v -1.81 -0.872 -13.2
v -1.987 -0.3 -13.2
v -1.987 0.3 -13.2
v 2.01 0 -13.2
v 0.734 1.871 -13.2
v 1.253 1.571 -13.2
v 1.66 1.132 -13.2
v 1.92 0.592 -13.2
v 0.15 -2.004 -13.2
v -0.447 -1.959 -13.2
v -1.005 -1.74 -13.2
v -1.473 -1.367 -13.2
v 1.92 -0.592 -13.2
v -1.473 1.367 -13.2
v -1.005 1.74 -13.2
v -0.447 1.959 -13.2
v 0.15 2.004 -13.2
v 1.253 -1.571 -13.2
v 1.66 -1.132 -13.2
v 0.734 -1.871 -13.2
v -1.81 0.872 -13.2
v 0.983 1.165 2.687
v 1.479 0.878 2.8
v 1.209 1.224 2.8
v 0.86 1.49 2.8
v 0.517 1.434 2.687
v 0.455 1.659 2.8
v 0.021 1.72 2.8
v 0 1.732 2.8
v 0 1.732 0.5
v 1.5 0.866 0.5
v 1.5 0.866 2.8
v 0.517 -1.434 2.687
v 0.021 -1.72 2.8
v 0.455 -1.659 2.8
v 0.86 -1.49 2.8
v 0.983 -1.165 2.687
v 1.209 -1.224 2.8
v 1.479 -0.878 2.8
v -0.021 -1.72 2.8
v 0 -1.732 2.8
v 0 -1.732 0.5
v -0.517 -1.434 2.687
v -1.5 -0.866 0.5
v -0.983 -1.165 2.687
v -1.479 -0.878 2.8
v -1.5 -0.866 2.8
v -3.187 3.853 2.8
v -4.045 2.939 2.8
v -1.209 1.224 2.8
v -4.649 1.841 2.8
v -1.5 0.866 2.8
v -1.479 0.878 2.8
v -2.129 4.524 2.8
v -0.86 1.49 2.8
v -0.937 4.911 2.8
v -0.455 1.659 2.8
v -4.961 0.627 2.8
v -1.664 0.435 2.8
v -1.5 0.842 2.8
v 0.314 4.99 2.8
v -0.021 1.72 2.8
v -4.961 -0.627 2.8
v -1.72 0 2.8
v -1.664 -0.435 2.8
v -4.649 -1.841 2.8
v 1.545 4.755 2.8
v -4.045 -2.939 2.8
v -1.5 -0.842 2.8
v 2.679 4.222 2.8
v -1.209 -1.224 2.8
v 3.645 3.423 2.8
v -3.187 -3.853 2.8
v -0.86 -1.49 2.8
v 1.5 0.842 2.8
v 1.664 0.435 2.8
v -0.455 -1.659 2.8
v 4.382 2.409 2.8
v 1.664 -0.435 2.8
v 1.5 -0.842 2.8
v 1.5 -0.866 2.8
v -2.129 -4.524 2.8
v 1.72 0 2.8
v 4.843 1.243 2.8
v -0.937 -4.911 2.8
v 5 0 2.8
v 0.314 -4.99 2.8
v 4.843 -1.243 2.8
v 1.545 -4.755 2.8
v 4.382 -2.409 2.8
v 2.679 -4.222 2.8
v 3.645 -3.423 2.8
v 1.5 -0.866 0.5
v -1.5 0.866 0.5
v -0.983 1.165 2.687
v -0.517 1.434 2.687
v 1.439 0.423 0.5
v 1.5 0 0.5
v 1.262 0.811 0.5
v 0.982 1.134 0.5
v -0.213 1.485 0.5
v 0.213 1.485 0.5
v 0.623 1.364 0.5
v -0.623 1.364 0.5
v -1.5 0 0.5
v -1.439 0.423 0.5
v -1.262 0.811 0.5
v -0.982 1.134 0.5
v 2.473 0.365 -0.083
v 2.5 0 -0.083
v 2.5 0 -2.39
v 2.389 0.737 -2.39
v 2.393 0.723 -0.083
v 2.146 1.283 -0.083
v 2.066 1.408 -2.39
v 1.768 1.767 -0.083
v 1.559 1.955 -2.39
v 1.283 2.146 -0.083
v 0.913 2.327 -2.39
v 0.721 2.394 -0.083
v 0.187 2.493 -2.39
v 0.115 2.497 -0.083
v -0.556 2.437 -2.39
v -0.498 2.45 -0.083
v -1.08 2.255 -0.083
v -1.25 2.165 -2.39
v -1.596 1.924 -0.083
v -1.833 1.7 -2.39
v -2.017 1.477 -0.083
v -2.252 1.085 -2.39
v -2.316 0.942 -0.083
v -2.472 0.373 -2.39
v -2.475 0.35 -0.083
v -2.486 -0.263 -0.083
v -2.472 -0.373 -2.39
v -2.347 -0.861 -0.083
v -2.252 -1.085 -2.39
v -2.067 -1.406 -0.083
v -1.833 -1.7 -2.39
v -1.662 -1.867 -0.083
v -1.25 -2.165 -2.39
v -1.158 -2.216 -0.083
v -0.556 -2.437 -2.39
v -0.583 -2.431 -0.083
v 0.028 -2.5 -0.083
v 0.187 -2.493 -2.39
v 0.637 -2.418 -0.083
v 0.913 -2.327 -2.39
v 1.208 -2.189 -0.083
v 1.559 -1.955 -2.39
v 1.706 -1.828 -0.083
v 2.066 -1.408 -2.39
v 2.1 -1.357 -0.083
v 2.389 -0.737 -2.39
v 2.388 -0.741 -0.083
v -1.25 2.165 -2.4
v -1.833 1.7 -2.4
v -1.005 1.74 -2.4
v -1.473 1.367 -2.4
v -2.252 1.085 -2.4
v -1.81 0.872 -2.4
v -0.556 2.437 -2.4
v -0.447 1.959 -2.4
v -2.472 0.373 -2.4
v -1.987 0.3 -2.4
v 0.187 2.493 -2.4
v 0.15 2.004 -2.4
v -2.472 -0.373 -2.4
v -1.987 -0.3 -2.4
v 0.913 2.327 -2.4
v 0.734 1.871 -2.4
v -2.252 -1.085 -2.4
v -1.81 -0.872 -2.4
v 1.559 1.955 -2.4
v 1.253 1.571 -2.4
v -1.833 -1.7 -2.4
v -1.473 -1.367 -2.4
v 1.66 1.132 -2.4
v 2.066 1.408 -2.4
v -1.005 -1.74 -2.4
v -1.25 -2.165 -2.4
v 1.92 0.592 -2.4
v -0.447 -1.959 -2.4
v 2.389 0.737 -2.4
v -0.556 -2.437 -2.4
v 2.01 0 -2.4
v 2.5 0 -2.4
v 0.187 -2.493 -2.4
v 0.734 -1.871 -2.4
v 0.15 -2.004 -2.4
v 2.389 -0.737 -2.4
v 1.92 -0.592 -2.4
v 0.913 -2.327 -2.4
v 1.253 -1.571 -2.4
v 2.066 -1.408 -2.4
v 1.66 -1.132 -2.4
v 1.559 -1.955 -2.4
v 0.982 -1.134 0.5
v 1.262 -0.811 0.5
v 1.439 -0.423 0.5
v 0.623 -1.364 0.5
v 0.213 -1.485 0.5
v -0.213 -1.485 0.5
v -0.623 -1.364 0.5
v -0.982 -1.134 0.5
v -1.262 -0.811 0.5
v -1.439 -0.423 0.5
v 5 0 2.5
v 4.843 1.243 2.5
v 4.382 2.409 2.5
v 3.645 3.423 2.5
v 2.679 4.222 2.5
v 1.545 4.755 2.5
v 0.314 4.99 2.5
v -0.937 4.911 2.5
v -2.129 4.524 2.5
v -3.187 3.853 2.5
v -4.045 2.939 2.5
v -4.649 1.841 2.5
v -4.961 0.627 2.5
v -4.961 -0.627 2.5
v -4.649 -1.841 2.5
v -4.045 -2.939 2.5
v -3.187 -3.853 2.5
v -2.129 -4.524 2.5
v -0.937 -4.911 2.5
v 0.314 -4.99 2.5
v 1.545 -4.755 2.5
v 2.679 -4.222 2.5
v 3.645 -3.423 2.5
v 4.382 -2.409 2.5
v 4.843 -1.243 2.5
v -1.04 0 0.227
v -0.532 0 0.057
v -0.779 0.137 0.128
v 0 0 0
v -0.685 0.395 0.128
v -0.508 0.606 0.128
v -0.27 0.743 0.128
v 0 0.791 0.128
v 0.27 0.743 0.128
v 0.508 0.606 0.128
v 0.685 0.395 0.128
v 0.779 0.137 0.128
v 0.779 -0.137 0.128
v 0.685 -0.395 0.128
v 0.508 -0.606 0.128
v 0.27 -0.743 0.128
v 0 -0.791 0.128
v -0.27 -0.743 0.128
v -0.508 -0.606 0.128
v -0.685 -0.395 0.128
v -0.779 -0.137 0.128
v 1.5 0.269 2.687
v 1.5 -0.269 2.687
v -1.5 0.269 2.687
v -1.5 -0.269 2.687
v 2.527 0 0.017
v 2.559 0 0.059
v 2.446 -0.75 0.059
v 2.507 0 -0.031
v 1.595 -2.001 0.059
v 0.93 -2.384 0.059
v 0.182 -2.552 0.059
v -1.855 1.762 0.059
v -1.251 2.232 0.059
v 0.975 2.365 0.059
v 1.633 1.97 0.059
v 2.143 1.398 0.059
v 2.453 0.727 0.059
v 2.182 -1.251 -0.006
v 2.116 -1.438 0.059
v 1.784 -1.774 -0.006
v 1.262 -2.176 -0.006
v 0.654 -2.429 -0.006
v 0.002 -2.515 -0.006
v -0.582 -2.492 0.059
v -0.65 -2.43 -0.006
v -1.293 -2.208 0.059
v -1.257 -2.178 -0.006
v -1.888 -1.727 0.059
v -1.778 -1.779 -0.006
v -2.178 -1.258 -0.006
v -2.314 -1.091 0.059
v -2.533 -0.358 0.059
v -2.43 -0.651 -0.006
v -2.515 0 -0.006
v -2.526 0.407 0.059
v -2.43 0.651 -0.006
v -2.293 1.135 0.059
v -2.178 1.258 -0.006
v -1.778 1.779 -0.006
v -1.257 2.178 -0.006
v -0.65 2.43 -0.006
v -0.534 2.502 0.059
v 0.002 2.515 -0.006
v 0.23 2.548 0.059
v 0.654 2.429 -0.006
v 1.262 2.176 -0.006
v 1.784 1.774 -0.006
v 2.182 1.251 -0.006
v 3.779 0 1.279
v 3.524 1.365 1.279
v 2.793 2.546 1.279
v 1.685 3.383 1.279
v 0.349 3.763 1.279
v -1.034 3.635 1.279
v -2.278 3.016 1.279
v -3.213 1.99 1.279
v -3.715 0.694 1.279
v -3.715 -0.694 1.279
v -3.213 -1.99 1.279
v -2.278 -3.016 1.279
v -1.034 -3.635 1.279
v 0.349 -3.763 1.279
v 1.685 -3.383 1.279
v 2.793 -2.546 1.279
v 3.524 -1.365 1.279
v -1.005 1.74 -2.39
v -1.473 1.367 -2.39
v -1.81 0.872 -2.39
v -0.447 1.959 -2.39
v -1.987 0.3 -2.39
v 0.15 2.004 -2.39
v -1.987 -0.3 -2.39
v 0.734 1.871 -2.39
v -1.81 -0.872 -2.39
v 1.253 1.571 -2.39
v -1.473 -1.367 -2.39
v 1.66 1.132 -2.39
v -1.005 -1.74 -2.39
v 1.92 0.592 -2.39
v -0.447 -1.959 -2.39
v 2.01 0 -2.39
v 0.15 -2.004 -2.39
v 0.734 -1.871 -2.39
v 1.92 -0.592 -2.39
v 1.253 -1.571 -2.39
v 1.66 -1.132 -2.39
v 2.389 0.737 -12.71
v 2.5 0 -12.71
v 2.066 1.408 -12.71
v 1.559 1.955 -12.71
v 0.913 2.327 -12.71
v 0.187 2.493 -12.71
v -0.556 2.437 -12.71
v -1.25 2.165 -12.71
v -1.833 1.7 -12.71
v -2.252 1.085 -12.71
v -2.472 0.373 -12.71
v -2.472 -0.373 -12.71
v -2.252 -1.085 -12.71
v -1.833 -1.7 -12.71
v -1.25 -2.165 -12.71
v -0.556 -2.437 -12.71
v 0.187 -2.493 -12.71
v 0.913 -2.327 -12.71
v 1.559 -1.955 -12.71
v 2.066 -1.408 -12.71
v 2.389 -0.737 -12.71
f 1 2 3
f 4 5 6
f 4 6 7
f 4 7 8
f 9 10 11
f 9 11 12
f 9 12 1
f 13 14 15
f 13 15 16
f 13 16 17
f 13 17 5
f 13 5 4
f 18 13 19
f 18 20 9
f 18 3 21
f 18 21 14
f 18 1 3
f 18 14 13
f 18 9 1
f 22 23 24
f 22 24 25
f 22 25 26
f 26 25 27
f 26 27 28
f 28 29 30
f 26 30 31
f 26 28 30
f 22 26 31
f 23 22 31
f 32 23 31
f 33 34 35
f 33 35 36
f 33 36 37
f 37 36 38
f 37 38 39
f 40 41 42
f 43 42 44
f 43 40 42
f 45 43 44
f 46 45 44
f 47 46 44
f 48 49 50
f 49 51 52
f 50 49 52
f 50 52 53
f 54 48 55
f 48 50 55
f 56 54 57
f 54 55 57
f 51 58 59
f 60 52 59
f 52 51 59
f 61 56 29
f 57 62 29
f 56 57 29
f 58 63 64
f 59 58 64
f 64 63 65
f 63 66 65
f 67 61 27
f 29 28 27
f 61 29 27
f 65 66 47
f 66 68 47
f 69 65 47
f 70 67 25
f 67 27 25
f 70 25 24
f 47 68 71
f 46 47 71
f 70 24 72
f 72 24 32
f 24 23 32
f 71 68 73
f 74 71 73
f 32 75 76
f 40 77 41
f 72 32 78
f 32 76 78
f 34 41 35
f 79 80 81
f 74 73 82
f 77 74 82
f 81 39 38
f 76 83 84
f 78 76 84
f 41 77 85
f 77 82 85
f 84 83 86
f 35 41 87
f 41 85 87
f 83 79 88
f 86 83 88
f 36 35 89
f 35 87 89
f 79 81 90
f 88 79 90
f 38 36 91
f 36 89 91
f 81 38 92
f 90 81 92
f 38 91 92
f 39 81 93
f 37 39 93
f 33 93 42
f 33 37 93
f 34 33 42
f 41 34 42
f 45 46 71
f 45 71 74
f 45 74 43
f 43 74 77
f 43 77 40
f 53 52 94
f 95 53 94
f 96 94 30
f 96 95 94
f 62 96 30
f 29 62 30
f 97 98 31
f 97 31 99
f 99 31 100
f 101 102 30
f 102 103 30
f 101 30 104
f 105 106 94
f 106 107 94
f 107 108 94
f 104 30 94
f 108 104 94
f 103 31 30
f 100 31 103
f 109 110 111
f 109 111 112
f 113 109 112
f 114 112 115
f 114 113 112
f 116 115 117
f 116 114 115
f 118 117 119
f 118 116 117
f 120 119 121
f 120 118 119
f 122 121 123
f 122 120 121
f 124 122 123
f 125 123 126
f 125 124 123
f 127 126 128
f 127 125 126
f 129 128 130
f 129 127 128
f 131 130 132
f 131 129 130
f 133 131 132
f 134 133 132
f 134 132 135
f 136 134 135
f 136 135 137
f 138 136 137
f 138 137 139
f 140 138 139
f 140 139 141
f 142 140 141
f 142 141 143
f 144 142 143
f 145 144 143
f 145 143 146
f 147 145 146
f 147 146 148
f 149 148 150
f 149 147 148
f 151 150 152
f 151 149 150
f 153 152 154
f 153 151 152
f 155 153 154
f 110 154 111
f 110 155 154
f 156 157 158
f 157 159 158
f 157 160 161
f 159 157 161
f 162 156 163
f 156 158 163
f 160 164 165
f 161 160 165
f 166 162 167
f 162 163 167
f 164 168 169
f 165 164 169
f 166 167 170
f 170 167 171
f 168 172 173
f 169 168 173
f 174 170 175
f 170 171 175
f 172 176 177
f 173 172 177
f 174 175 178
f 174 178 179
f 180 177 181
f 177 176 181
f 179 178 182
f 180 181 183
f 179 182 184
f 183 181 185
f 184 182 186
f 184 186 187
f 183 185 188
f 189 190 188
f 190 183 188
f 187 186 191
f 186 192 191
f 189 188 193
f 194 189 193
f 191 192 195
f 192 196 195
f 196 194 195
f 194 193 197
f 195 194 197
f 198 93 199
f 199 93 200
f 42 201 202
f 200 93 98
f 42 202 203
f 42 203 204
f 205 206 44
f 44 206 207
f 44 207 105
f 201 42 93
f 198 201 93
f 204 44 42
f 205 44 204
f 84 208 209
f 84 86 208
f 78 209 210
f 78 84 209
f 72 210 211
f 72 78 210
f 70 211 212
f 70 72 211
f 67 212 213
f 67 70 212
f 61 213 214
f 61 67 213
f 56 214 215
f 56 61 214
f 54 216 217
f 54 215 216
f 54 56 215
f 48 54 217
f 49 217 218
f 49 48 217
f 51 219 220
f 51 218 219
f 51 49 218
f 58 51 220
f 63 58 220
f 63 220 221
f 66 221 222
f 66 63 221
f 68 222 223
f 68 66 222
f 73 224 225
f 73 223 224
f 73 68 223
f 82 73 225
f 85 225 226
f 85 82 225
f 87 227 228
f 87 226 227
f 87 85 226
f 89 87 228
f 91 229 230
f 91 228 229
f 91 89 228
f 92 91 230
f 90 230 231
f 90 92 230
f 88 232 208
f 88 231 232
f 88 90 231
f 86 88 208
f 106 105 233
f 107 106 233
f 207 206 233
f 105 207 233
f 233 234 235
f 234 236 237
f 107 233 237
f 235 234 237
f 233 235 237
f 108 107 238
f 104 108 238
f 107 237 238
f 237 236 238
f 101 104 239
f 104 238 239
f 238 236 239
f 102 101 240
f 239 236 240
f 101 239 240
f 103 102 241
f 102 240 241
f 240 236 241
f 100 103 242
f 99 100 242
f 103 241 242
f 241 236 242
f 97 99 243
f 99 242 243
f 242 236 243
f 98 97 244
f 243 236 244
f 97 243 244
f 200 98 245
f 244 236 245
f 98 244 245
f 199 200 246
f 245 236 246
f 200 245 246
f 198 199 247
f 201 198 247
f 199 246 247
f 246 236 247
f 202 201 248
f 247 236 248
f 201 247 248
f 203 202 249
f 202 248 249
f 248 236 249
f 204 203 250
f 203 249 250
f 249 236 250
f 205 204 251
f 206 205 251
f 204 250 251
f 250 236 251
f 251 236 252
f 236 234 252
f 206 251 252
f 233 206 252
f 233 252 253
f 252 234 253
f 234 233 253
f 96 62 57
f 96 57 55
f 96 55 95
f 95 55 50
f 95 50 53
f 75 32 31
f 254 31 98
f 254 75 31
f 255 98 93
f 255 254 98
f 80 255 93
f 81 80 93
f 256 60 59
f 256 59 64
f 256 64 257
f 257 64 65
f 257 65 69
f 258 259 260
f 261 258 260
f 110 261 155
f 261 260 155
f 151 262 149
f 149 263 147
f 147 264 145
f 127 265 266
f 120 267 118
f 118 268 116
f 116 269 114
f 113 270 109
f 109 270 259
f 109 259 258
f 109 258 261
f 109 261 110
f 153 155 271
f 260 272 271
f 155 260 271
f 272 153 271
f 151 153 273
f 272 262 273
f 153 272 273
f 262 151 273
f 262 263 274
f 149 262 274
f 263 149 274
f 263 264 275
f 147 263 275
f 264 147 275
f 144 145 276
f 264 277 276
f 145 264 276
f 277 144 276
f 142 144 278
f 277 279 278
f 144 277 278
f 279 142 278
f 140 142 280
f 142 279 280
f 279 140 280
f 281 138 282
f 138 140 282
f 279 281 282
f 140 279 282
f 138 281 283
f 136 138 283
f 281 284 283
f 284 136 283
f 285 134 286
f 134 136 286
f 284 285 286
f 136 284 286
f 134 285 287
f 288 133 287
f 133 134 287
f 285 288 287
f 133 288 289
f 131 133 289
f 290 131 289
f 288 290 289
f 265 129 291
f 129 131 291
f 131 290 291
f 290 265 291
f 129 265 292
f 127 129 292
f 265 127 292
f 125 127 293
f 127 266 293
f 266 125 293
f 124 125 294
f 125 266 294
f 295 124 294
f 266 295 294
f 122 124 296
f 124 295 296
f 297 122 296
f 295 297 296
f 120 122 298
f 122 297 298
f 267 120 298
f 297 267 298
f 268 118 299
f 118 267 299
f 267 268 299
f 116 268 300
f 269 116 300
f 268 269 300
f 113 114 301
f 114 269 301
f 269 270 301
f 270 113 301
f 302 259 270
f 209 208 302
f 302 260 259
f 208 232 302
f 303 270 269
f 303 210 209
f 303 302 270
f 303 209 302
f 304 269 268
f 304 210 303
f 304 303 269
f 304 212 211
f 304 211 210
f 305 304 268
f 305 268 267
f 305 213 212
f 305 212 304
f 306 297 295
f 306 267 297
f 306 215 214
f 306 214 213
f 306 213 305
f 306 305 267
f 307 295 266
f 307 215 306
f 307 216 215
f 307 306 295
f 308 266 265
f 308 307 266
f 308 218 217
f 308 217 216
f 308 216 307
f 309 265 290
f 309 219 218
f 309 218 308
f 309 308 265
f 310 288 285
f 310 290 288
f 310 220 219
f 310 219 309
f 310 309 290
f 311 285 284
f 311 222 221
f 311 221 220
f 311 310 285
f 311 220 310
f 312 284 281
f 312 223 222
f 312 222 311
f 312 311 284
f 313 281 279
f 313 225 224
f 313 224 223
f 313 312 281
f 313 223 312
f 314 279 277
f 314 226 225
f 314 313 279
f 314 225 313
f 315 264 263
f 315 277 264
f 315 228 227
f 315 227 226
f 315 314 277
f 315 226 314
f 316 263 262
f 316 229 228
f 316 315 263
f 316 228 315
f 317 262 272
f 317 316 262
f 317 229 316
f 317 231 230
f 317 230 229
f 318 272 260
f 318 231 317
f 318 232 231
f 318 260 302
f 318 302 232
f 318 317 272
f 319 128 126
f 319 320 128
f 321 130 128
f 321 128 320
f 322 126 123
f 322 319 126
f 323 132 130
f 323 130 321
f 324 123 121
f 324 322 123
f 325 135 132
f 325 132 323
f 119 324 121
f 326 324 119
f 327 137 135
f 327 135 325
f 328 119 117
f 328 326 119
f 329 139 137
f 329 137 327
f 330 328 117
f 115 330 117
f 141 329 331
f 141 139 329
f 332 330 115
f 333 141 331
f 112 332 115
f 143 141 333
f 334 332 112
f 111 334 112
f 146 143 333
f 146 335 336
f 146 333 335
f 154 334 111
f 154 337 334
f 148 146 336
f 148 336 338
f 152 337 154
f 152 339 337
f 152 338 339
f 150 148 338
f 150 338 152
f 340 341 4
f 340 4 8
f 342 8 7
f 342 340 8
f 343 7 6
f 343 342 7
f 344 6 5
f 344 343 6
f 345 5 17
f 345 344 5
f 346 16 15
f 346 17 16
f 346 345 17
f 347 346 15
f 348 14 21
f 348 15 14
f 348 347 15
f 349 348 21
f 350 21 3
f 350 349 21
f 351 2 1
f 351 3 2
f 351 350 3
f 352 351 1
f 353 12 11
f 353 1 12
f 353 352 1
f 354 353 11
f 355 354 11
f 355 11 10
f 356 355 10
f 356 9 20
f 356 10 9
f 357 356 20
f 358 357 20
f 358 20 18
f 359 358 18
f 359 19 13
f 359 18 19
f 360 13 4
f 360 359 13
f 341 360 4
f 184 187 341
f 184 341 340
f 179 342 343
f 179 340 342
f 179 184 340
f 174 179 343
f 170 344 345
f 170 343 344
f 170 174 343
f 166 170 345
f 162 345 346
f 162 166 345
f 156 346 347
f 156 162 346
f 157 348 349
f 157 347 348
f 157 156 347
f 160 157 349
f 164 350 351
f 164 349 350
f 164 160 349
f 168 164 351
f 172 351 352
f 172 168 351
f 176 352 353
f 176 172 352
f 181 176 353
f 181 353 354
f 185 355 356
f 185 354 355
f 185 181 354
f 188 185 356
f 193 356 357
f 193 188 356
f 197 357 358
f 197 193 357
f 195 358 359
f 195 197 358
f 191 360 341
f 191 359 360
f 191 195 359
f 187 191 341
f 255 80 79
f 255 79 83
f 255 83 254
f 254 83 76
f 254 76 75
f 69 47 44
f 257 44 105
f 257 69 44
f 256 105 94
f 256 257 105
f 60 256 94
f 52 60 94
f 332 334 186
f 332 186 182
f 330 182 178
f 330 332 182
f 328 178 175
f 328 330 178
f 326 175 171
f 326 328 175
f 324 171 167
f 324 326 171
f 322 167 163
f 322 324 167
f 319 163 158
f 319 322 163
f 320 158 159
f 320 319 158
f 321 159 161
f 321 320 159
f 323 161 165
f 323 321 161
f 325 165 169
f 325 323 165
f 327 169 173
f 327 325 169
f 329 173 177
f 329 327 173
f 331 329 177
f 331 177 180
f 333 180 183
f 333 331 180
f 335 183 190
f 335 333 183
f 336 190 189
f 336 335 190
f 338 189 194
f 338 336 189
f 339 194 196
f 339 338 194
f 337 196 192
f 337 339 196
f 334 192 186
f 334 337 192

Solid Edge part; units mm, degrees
sketch "Sketch1" plane through (0, 0, 0) normal (0, -1, 0) x (1, 0, 0)
  line L0 (2.5, 0) -> (5, 2.5)
  line L1 (5, 2.5) -> (5, 2.8)
  line L2 (5, 2.8) -> (0, 2.8)
  line L3 (0, 2.8) -> (0, -13.2)
  line L4 (0, -13.2) -> (2.0095, -13.2)
  line L5 (2.0095, -13.2) -> (2.5, -12.7095)
  line L6 (2.5, -12.7095) -> (2.5, -2.4)
  line L7 (2.5, -2.4) -> (2.0095, -2.4)
  line L8 (2.0095, -2.4) -> (2.0095, -2.39)
  line L9 (2.0095, -2.39) -> (2.5, -2.39)
  line L10 (2.5, -2.39) -> (2.5, 0)
  dimension "D1" = 16
  dimension "D2" = 5
  dimension "D3" = 2.8
  dimension "D4" = 0.01
  dimension "D5" = 2.0095
  dimension "D6" = 5.2
  dimension "D7" = 0.3
revolve "RevolvedProtrusion1" add sketch "Sketch1" angle 360 about axis through (0, 0, 54) along (0, 0, -1)
sketch "Sketch2" plane through (0, 0, 0) normal (0, -1, 0) x (1, 0, 0)
  arc A0 (-1.5, 0.5) -> (0, 0) centre (0, 2.5) ccw
  line L0 (0, 0.5) -> (0, 0)
  line L1 (-1.5, 0.5) -> (0, 0.5)
  dimension "D1" = 13.7
revolve "RevolvedCutout1" cut sketch "Sketch2" angle 360 about axis through (0, 0, 54) along (0, 0, -1)
sketch "Sketch3" plane through (0, 0, 2.8) normal (0, 0, 1) x (0, -1, 0)
  line L0 (-1.7321, 0) -> (-0.866, 1.5)
  line L1 (-0.866, 1.5) -> (0.866, 1.5)
  line L2 (0.866, 1.5) -> (1.7321, 0)
  line L3 (1.7321, 0) -> (0.866, -1.5)
  line L4 (0.866, -1.5) -> (-0.866, -1.5)
  line L5 (-0.866, -1.5) -> (-1.7321, 0)
  dimension "D1" = 3
extrude "Cutout1" cut sketch "Sketch3" against normal blind 2.3
cosmetic_thread "Thread1" size "M5"
sketch "Sketch4" plane through (0, 0, 0) normal (1, 0, 0) x (0, 1, 0)
  line L0 (-1.72, 2.8) -> (0, 1.807)
revolve "RevolvedCutout2" cut sketch "Sketch4" angle 360 about axis through (0, 0, -57) along (0, 0, 1) material side at (0, -0.835, 2.3468)
fillet "Round1" radius 0.2 1 edges at (-2.5, 0, 0)
properties material "Stahl"
